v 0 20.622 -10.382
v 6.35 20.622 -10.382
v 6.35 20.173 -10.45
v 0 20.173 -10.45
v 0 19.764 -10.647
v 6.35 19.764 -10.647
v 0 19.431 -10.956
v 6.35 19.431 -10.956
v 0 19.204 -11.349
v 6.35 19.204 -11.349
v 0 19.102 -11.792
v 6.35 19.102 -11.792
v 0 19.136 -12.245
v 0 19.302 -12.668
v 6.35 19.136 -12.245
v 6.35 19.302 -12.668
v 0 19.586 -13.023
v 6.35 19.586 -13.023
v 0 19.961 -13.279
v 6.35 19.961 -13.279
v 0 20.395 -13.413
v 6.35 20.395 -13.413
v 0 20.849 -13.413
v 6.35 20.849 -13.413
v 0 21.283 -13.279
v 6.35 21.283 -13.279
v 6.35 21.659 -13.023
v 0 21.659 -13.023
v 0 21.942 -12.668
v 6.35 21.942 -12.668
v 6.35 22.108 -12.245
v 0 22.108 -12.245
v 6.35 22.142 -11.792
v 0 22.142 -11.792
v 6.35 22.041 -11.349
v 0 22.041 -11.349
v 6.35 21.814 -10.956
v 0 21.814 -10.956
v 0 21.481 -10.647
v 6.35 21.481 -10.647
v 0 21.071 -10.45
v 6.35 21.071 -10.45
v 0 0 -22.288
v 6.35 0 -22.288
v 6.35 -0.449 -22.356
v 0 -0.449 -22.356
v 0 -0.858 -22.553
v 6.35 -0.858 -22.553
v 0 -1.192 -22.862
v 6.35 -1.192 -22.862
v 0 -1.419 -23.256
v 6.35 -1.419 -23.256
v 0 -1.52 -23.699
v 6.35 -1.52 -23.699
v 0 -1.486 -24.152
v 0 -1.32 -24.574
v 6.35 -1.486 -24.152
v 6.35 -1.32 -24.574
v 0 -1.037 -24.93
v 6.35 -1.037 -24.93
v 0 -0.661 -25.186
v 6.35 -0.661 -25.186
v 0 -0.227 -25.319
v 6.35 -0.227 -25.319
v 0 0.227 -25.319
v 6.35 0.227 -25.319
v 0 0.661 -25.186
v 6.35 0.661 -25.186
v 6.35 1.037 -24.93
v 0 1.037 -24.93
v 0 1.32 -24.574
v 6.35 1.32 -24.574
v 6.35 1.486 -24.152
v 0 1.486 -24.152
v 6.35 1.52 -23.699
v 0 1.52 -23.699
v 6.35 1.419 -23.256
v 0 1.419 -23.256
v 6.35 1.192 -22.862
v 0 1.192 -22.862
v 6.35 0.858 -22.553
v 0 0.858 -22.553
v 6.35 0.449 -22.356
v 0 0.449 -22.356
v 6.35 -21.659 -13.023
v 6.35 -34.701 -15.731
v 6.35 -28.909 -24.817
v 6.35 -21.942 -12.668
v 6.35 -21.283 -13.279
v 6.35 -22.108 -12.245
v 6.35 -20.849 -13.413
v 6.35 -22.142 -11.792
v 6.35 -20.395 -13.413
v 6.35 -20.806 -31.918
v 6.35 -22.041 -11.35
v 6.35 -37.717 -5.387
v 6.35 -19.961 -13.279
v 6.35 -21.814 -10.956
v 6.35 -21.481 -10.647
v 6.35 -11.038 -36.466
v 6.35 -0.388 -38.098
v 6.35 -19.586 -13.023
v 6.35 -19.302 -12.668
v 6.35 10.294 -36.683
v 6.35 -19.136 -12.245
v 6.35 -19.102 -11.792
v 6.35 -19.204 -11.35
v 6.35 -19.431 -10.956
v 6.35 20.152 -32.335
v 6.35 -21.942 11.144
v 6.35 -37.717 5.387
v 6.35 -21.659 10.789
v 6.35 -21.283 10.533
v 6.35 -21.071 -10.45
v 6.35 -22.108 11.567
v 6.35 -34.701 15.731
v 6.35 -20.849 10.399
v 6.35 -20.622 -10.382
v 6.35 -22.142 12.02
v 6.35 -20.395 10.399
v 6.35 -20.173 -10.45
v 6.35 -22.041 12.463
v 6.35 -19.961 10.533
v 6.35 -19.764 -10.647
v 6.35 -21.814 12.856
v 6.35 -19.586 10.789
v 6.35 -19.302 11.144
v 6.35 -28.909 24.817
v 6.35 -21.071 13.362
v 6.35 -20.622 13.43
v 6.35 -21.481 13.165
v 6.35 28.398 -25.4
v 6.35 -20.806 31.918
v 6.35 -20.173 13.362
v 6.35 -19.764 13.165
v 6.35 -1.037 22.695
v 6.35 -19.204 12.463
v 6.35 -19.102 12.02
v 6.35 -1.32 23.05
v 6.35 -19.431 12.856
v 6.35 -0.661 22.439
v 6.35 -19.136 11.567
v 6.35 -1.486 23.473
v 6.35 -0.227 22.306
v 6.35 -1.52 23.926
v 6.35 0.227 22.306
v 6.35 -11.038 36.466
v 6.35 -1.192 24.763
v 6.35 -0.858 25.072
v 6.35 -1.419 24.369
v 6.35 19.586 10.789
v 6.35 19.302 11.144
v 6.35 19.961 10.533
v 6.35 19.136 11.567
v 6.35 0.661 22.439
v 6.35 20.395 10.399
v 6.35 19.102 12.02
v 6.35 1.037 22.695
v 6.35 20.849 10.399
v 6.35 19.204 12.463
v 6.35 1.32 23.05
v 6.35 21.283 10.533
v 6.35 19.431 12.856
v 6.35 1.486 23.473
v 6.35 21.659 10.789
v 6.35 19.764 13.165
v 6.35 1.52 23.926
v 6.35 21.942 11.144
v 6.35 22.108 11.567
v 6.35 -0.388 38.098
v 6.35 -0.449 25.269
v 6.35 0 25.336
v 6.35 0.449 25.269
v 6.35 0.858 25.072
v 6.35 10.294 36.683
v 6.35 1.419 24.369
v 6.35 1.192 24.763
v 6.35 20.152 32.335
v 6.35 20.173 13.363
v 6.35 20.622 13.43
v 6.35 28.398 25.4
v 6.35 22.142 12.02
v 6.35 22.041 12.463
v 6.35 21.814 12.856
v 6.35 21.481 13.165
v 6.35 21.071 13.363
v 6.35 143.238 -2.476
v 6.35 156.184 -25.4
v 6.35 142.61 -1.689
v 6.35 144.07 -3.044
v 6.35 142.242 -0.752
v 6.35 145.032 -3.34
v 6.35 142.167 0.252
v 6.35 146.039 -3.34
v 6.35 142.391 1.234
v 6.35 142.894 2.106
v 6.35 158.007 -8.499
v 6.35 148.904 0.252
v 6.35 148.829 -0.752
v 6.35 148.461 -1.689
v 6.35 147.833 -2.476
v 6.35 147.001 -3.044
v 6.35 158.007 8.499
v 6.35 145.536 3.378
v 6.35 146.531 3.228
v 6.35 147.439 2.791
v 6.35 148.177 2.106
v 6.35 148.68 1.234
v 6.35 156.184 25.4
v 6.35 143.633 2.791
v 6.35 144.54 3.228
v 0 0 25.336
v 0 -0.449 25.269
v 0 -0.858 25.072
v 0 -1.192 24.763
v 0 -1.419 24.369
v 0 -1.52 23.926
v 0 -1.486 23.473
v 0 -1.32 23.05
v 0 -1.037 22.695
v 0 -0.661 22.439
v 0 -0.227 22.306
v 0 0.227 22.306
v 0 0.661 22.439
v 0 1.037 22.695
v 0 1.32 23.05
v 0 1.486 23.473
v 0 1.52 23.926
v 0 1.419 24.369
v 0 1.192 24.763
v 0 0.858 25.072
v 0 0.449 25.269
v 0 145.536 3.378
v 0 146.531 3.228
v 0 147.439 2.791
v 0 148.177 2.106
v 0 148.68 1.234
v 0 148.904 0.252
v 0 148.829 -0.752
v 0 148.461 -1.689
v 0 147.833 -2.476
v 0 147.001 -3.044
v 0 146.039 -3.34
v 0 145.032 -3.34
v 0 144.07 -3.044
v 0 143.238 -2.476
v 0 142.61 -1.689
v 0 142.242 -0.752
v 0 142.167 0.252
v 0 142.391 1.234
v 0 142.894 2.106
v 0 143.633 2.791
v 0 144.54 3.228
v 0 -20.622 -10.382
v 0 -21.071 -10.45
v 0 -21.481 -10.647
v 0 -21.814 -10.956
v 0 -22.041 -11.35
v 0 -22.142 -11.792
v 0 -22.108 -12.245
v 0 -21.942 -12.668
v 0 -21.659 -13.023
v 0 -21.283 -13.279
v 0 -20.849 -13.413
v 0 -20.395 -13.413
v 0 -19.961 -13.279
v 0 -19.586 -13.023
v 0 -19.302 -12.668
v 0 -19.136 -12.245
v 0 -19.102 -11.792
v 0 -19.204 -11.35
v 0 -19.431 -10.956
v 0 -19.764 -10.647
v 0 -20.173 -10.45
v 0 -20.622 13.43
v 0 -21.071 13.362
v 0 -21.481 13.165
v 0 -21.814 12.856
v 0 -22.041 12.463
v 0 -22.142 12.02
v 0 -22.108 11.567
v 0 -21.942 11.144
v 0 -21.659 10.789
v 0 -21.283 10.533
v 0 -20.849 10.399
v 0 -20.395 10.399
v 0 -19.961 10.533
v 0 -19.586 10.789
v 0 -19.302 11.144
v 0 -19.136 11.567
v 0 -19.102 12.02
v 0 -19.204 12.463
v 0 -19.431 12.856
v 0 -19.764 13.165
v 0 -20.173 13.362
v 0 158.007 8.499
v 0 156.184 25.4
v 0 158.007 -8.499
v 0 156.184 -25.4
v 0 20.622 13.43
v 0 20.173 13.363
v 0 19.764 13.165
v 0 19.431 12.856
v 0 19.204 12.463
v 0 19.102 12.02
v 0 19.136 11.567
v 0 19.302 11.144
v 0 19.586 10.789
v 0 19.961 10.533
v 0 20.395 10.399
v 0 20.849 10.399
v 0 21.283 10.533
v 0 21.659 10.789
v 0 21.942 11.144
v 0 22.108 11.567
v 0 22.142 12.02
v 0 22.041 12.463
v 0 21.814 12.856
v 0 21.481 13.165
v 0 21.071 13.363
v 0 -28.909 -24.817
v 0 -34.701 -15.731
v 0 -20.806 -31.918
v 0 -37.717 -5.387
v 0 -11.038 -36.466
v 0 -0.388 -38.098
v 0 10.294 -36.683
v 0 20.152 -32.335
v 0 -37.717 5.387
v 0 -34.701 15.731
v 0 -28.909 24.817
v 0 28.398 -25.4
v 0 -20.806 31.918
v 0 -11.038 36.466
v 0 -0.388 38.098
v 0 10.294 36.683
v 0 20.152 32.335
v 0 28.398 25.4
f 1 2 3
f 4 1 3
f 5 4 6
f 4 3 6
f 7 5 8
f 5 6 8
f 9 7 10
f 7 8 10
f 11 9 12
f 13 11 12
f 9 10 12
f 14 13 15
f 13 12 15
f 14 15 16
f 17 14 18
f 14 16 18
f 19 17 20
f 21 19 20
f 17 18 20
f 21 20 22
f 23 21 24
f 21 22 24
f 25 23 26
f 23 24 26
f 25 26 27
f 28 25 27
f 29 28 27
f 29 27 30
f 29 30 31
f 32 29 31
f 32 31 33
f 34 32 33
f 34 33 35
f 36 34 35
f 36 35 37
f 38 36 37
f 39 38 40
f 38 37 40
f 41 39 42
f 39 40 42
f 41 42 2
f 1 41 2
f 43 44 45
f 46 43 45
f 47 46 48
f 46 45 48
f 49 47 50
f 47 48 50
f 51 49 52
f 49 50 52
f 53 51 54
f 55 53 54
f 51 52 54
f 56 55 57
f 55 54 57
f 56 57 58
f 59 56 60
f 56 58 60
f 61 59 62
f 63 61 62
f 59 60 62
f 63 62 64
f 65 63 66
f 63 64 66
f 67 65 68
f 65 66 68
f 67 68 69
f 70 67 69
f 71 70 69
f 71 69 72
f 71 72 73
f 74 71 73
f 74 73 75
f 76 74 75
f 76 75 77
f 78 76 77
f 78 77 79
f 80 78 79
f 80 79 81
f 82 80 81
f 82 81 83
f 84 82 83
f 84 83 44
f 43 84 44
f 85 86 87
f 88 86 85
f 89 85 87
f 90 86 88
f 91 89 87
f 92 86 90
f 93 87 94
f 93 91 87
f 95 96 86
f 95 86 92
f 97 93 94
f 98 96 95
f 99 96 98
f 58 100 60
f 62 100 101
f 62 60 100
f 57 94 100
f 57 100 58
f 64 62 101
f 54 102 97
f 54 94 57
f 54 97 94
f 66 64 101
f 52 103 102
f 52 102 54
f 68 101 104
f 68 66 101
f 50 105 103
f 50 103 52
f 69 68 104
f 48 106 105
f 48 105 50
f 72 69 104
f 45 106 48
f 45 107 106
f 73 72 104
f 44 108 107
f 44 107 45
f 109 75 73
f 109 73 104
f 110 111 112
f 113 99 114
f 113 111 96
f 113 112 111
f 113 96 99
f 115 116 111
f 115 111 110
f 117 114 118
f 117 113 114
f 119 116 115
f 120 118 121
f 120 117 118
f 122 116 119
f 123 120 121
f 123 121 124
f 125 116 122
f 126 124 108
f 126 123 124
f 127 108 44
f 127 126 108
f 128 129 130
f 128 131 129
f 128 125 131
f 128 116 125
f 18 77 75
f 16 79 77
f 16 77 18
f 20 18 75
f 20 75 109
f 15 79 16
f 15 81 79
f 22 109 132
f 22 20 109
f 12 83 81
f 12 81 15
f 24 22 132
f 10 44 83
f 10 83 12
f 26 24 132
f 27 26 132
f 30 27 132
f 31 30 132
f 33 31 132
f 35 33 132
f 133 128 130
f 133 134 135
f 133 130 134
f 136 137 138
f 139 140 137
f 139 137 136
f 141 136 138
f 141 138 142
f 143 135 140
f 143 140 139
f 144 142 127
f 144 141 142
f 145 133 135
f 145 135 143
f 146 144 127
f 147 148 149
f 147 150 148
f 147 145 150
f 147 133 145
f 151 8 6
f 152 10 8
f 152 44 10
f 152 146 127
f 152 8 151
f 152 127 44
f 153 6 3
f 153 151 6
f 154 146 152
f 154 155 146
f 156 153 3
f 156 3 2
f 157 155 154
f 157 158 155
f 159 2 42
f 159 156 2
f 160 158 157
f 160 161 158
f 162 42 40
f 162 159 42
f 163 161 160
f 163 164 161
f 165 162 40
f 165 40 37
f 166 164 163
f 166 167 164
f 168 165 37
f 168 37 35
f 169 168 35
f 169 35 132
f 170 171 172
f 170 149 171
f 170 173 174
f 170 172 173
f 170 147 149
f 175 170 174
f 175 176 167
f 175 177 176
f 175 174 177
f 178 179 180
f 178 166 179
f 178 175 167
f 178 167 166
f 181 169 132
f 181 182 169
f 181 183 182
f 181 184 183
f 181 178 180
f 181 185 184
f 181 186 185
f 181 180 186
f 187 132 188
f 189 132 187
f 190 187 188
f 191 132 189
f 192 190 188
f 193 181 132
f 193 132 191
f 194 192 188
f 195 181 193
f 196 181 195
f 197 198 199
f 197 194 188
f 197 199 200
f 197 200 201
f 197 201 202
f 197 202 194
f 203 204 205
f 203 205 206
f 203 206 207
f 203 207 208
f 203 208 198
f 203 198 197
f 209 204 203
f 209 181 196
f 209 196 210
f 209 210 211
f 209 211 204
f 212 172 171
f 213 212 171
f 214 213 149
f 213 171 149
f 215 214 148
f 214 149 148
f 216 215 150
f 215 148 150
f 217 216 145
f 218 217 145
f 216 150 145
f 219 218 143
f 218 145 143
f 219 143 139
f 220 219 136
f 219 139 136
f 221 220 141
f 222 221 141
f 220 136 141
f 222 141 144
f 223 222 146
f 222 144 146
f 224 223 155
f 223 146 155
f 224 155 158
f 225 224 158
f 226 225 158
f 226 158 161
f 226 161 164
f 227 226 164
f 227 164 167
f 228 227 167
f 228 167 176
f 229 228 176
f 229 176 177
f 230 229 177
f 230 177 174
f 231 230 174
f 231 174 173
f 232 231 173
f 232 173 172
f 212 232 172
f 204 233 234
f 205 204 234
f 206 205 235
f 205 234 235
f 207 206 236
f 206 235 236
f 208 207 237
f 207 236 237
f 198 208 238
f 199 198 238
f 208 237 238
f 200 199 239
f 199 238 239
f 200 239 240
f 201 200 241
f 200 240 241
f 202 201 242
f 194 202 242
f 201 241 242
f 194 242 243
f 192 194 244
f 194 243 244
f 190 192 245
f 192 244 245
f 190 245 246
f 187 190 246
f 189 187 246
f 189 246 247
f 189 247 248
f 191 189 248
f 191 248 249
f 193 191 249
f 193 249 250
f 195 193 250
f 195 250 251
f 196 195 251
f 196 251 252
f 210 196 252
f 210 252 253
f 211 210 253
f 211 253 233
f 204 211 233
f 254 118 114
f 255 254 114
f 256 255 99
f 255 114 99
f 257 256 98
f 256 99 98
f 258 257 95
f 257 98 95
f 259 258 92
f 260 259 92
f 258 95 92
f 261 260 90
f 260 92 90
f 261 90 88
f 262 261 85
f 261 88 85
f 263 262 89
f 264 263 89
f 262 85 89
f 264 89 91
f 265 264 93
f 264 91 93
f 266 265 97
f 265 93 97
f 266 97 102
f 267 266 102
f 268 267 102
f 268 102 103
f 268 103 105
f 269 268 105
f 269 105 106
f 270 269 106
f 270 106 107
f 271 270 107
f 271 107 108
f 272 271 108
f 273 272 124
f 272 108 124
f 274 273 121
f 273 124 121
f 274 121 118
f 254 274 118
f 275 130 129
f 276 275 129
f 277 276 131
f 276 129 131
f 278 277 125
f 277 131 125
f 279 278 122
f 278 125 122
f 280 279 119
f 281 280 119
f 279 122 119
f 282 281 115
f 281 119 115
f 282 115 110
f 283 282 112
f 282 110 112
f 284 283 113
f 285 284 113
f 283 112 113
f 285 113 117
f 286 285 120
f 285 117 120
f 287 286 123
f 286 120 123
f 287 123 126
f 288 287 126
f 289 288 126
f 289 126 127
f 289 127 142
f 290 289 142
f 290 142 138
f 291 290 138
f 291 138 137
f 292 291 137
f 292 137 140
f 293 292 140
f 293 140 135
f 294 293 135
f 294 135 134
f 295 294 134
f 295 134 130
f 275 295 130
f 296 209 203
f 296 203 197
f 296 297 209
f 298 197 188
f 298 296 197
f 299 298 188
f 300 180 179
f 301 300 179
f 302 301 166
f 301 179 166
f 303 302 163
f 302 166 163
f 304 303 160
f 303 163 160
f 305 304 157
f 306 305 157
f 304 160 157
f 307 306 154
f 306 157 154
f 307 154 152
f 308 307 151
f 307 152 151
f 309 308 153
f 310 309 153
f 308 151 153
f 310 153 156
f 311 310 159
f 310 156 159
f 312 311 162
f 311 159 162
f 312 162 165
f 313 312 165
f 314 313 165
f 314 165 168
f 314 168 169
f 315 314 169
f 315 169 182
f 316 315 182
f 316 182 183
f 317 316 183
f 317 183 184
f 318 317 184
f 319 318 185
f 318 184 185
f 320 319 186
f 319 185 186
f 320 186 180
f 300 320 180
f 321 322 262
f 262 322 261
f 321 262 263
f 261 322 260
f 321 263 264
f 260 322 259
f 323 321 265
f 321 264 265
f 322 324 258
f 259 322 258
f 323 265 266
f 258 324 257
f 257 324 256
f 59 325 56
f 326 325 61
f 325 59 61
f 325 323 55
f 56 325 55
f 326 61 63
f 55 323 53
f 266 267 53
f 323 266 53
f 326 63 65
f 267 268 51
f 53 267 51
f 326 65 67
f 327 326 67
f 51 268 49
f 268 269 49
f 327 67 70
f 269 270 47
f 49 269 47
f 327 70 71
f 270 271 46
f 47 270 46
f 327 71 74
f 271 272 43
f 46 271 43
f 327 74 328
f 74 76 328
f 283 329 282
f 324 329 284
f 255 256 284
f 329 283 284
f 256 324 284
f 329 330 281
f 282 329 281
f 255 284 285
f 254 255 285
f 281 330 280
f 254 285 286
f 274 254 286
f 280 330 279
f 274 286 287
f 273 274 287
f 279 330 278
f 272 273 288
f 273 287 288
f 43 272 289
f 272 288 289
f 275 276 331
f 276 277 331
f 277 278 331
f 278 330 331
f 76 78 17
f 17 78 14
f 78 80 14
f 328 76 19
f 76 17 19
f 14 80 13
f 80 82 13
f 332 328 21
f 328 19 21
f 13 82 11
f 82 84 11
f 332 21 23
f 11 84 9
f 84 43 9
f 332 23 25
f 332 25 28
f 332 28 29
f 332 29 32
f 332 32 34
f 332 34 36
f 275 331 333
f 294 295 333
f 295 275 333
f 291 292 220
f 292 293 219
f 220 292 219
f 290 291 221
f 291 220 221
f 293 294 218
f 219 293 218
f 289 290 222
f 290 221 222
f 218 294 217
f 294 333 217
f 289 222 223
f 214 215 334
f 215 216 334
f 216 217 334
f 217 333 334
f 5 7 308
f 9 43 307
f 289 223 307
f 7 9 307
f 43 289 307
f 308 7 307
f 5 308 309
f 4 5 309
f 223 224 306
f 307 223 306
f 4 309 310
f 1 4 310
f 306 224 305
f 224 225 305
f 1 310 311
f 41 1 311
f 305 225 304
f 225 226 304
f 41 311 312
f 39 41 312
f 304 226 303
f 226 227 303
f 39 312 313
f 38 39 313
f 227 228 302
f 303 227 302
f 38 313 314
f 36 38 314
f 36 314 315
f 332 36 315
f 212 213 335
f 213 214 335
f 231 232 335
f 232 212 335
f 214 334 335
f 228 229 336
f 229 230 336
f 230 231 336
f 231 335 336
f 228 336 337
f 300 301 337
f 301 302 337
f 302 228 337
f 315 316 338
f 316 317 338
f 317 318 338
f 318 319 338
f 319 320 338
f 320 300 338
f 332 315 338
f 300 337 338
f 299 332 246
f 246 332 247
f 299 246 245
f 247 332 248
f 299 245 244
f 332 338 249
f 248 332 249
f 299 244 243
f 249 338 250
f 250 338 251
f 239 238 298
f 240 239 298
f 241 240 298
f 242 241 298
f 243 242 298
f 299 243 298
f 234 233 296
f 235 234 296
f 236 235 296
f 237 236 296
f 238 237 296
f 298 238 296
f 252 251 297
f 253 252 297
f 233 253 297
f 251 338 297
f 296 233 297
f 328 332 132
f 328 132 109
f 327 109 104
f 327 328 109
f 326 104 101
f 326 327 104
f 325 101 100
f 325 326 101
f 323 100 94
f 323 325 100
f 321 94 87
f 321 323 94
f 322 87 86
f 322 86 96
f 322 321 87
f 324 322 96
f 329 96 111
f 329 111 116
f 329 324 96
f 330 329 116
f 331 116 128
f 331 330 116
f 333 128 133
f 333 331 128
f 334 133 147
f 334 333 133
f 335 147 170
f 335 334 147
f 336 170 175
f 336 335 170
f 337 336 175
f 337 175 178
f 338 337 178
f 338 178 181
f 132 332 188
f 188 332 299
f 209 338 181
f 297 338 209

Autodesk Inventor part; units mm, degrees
ref_plane "YZ Plane" through (0, 0, 0) normal (1, 0, 0) x (0, 1, 0)
ref_plane "XZ Plane" through (0, 0, 0) normal (0, 1, 0) x (-1, 0, 0)
ref_plane "XY Plane" through (0, 0, 0) normal (0, 0, 1) x (1, 0, 0)
sketch "Sketch1" plane through (0, 0, 0) normal (1, 0, 0) x (0, 1, 0)
  circle A0 centre (0, 0) radius 158.2356
  dimension "d0" = 316.4711
extrude "Extrusion1" add sketch "Sketch1" along normal blind 6.35
sketch "Sketch2" plane through (0, 0, 0) normal (-1, 0, 0) x (0, 0, 1)
  circle A0 centre (0, 145.5356) radius 3.3782
  point P0 (0, 0)
  dimension "d3" = 6.7564
  dimension "d4" = 145.5356
extrude "Extrusion2" cut sketch "Sketch2" against normal through all
sketch "Sketch3" plane through (0, 0, 0) normal (-1, 0, 0) x (0, 0, 1)
  point P0 (0, 0)
  point P1 (23.8125, 0)
  point P2 (11.9063, 20.6222)
  point P3 (-11.9062, 20.6222)
  point P4 (-23.8125, 0)
  point P5 (-11.9063, -20.6222)
  point P6 (11.9062, -20.6222)
  dimension "d7" = 23.8125
  dimension "d10" = 360
hole "Hole1" at (0, 0, 23.8125) at (0, 20.6222, 11.9063) at (0, 20.6222, -11.9062) at (0, 0, -23.8125) at (0, -20.6222, -11.9063) at (0, -20.6222, 11.9062) direction (1, 0, 0) diameter 3.048 end through all
sketch "Sketch6" plane through (0, 0, 0) normal (-1, 0, 0) x (0, 0, 1)
  arc A0 (-25.4, 28.3981) -> (25.4, 28.3981) centre (0, 0) ccw
  line L0 (-25.4, 28.3981) -> (-25.4, 156.1837)
  circle A1 centre (0, 0) radius 158.2356 projected
  line L1 (25.4, 28.3981) -> (25.4, 156.1837)
  dimension "d29" = 25.4
  dimension "d30" = 25.4
  dimension "d31" = 76.2
extrude "Extrusion4" cut sketch "Sketch6" against normal through all contours A0 L1 A1 L0 picked at (-31.115, 112.3302)
equation "\"d0\" = camPlateDiam"
equation "\"d1\" = camPlateThickness"
equation "\"d3\" = camPostHoleDiam"
equation "\"d4\" = camRadius"
equation "\"d5\" = camPlateThickness"
equation "\"d7\" = am6HoleRadius"
equation "\"camPlateThickness\" = 6.35"
equation "\"camPostHoleDiam\" = 6.7564"
equation "\"camPostHeight\" = 25.4"
equation "\"camRadius\" = 0.5 * camDiam"
equation "\"aM6HoleDiam\" = 47.625"
equation "\"am6HoleRadius\" = 0.5 * aM6HoleDiam"
equation "\"centerHoleDiam\" = 28.575"
equation "\"camStroke\" = 152.4"
equation "\"pi\" = 79.7941"
equation "\"camPlateDiam\" = 316.471144"
equation "\"camDiam\" = 291.071144"
properties part number "camPlate" material "Aluminum 6061"
